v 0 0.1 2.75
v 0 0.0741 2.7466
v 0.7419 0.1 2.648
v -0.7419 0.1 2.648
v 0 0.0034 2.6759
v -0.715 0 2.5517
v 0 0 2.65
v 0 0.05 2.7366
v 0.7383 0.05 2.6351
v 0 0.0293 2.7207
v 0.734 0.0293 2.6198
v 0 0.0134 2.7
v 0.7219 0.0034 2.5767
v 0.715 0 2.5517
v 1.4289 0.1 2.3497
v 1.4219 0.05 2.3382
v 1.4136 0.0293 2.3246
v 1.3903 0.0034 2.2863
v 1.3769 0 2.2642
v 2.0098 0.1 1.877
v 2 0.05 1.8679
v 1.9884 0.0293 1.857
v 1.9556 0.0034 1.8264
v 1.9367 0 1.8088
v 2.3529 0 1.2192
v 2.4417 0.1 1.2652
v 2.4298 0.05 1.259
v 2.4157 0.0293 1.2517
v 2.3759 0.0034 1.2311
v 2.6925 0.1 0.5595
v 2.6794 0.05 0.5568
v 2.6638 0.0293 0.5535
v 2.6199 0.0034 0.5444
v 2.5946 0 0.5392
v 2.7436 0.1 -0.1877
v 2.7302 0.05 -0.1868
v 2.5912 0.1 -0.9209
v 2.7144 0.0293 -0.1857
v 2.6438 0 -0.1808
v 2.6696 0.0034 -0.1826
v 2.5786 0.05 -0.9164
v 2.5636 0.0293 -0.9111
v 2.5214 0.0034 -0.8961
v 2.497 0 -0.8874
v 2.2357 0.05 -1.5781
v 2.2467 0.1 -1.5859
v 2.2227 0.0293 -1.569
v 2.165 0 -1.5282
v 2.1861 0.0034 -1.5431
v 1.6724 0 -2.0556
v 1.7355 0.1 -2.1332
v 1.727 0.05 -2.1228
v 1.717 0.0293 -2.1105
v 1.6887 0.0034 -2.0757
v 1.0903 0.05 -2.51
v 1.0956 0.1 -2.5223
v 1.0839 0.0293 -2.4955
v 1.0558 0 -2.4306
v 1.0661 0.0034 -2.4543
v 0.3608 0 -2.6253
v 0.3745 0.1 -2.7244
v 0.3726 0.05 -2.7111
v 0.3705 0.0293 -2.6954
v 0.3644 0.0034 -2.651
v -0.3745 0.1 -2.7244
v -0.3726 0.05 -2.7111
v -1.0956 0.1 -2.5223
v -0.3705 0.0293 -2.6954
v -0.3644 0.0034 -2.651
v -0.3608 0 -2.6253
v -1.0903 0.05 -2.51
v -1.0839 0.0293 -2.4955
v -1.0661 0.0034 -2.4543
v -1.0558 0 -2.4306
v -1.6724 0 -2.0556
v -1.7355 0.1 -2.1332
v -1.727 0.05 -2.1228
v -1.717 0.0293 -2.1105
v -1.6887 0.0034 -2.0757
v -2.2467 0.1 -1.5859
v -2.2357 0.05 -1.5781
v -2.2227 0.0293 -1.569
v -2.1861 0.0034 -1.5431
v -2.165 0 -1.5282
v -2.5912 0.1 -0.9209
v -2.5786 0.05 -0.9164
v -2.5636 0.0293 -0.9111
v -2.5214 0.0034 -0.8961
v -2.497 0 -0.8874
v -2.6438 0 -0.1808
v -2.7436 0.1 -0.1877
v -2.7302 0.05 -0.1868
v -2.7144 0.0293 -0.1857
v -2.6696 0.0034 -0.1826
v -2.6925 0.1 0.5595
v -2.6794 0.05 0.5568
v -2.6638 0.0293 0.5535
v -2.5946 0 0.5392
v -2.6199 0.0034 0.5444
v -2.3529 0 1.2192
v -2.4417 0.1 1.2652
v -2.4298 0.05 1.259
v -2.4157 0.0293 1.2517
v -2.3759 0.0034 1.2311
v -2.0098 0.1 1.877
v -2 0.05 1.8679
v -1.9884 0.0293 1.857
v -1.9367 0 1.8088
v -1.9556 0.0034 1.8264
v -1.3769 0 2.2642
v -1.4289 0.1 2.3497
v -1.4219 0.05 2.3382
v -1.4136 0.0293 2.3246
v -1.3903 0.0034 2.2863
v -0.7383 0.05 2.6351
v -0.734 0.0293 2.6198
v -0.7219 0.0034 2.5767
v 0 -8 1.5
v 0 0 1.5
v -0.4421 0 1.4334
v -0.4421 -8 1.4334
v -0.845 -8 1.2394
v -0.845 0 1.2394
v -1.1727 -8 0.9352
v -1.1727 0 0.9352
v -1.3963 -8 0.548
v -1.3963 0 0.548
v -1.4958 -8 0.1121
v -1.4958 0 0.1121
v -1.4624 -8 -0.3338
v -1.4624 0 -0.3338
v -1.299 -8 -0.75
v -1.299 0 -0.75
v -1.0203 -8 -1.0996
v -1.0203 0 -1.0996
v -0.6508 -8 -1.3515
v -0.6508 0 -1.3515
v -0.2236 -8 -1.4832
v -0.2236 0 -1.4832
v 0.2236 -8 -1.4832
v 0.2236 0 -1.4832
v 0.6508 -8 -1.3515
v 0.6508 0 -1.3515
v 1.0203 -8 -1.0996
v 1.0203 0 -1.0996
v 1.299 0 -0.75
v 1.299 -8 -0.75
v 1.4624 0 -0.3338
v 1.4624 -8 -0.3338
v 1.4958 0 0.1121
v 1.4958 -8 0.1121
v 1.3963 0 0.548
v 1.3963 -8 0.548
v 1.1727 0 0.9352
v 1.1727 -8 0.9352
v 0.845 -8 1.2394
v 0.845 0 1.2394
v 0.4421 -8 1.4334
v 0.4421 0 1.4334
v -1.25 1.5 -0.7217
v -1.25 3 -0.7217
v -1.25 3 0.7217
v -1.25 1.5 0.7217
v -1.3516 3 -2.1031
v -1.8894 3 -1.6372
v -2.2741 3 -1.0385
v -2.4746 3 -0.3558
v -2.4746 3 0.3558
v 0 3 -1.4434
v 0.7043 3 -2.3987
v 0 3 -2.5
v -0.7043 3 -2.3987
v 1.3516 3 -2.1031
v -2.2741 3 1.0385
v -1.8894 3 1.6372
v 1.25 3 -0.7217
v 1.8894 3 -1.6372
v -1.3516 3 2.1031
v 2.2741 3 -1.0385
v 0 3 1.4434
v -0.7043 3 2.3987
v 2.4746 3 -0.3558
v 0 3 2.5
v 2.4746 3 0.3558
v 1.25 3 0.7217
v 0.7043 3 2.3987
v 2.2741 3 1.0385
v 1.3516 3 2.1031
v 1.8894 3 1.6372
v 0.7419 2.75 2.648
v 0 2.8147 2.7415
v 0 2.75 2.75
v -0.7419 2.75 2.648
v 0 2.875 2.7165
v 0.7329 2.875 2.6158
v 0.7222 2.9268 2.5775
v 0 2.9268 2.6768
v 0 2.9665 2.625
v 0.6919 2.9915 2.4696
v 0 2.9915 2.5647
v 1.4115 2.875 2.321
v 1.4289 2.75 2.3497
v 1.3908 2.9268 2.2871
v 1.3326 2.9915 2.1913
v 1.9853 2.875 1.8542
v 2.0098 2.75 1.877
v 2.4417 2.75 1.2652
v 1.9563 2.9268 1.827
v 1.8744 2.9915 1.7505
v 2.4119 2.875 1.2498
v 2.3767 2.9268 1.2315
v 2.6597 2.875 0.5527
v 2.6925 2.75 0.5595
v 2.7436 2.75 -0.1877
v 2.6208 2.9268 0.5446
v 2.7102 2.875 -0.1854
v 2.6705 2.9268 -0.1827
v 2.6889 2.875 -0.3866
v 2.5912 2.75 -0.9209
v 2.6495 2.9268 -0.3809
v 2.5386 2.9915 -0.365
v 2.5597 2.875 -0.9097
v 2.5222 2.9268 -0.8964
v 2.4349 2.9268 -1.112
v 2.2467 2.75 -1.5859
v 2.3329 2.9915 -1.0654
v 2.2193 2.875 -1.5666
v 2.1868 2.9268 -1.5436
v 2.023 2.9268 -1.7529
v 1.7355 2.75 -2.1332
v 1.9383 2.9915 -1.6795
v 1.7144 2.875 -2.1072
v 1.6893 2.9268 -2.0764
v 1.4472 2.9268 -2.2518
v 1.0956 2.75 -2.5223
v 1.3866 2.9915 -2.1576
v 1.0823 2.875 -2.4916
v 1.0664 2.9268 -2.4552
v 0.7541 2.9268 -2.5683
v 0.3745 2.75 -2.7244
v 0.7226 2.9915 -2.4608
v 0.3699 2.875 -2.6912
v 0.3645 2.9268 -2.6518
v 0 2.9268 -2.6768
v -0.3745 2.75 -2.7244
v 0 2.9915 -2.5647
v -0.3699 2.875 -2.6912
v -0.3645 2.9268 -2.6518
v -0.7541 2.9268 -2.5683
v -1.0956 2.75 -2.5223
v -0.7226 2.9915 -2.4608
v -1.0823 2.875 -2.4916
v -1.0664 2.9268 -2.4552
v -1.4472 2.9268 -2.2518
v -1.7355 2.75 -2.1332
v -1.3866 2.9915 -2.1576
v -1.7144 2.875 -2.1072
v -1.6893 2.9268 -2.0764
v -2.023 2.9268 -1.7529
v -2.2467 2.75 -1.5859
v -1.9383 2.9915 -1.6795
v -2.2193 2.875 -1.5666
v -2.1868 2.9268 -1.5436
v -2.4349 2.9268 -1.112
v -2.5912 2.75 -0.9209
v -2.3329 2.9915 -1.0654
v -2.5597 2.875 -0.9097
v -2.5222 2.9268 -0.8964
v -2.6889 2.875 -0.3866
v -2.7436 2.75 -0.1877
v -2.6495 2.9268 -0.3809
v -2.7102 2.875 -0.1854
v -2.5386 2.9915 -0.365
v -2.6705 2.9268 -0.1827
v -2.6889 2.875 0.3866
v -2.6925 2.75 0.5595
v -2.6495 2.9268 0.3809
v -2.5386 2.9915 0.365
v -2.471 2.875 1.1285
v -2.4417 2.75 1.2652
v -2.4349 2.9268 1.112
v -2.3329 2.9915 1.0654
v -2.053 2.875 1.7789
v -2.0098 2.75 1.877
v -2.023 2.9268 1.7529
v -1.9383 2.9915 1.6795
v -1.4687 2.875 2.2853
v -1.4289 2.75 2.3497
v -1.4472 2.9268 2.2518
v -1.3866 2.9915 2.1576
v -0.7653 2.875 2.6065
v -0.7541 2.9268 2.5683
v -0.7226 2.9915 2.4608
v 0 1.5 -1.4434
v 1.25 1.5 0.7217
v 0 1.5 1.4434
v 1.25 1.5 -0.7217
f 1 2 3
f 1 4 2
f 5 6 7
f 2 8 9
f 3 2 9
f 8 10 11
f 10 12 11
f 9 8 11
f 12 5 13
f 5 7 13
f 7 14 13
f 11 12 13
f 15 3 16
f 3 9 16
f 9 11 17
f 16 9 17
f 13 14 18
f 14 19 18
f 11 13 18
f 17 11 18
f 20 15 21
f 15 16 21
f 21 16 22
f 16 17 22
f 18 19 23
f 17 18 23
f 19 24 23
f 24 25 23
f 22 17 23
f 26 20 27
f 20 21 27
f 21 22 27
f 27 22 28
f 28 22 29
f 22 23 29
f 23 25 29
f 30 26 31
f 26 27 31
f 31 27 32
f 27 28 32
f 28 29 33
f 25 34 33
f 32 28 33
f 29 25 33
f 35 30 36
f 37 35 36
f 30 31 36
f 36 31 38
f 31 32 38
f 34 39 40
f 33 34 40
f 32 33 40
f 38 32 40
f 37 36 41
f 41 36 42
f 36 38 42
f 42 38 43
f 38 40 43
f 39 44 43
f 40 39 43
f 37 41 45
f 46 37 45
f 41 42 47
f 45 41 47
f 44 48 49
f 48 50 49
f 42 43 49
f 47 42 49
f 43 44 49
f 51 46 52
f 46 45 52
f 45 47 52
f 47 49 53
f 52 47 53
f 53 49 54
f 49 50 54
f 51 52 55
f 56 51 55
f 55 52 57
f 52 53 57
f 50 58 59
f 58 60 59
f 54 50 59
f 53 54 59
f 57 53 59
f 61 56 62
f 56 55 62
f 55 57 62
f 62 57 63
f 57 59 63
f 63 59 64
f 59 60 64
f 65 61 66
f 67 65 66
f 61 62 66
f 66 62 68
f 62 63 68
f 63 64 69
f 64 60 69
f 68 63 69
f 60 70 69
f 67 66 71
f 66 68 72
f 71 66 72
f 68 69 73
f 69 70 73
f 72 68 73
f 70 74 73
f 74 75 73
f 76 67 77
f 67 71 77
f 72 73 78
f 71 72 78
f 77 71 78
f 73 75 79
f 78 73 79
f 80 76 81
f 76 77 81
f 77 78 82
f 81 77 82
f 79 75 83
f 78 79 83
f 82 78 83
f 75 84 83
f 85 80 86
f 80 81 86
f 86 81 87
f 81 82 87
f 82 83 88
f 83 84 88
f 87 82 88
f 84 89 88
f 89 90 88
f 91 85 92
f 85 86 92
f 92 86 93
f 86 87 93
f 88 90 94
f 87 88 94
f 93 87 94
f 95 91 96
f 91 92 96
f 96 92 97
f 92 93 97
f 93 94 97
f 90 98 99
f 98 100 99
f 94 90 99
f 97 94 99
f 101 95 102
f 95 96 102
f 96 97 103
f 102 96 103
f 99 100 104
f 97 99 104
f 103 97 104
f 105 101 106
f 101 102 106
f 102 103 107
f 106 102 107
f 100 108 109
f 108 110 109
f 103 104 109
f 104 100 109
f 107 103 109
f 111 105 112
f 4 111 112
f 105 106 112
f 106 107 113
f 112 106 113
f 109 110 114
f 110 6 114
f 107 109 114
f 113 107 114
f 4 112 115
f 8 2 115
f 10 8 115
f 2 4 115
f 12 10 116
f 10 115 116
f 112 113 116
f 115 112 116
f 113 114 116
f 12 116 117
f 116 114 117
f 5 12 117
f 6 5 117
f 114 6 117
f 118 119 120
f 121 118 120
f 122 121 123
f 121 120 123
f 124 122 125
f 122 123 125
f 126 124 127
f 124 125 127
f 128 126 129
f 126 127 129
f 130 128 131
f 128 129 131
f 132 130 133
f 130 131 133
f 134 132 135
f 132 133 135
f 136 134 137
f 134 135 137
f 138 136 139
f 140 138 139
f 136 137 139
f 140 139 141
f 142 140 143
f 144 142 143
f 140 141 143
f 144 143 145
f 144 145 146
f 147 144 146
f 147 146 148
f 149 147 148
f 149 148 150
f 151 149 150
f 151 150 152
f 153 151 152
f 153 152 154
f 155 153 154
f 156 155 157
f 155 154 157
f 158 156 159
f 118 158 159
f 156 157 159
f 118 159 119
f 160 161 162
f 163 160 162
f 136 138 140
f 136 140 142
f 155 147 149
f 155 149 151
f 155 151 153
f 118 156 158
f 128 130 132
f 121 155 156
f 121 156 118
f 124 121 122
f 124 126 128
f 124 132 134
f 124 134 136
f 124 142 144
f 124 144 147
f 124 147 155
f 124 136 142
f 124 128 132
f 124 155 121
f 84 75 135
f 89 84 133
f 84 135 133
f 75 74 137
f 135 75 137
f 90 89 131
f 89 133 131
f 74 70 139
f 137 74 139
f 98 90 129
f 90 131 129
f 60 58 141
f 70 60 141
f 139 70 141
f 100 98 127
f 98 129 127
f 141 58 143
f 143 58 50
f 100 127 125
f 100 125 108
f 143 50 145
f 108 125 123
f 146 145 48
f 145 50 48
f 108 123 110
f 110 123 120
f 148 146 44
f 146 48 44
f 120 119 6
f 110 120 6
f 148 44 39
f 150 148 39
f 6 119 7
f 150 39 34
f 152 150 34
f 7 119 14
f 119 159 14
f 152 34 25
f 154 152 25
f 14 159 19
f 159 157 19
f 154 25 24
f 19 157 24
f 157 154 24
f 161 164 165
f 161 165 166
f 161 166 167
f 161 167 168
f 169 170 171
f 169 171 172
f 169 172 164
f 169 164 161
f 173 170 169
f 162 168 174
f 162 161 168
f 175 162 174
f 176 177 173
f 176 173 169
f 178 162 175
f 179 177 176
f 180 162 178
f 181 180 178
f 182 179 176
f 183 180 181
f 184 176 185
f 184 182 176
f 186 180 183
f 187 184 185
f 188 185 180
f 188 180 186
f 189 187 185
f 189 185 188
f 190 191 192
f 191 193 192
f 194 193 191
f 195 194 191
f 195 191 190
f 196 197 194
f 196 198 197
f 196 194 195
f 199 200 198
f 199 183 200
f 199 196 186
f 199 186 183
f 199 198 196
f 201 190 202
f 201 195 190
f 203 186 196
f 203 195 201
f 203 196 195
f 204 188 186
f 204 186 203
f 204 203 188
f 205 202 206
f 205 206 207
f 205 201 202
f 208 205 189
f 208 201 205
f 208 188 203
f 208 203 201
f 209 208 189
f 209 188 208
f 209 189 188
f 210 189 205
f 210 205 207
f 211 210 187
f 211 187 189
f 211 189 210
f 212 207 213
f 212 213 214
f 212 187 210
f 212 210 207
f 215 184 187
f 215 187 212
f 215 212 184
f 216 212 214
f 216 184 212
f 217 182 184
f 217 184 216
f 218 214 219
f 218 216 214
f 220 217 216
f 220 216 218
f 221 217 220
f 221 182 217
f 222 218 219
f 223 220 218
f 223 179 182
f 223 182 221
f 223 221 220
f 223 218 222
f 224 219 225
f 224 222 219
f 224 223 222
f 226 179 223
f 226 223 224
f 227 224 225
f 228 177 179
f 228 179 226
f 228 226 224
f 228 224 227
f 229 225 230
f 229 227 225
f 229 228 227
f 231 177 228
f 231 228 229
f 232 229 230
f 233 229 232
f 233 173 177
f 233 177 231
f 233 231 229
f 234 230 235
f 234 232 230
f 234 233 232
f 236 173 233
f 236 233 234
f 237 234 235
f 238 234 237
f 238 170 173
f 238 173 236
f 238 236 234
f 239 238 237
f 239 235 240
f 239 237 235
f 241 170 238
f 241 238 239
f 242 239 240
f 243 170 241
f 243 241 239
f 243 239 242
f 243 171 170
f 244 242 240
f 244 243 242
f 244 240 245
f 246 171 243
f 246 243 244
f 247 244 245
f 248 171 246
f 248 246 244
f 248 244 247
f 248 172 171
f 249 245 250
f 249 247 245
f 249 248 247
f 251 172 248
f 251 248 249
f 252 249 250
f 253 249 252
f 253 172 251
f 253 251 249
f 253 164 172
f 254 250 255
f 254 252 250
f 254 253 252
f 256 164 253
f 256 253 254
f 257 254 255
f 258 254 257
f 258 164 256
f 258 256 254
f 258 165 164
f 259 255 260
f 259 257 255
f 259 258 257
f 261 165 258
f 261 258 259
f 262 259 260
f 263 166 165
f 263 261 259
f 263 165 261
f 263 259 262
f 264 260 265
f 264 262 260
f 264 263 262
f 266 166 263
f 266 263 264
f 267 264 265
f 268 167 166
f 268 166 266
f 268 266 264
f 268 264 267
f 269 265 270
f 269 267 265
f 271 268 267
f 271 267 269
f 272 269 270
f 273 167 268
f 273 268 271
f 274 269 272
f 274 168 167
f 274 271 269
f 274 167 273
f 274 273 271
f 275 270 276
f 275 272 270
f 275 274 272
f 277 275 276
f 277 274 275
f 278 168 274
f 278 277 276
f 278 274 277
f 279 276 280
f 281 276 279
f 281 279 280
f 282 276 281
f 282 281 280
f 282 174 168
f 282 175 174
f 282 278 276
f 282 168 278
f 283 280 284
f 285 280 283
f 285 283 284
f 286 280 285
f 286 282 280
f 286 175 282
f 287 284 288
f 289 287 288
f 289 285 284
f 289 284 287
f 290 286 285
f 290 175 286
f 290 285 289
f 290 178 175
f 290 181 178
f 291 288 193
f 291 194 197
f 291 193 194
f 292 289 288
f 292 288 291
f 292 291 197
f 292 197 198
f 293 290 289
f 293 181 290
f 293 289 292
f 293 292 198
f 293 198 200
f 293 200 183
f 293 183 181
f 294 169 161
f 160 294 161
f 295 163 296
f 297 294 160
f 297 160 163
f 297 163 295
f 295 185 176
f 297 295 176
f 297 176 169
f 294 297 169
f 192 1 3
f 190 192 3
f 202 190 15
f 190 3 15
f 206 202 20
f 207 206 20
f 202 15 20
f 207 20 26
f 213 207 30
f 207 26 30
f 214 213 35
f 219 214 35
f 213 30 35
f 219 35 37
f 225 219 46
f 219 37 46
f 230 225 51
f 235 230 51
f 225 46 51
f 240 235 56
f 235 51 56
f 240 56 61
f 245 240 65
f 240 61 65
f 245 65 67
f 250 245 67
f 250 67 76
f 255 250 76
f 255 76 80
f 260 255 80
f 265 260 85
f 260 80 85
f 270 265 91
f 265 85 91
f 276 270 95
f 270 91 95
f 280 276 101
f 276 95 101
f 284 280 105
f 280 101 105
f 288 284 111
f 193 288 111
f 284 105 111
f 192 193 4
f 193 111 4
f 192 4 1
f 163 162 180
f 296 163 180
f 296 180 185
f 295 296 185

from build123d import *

# Parameters (mm, degrees)
ESBO_O1_R                = 2.75
RESSALTO_EXTRUS_O1_DEPTH = 3
CORTE_EXTRUS_O1_DEPTH    = 1.5
FILETE1_R                = 0.25
FILETE2_R                = 0.1
ESBO_O3_R                = 1.5
RESSALTO_EXTRUS_O2_DEPTH = 8


with BuildPart() as part:
    # Esboço1 → Ressalto-extrusão1 (new body)
    with BuildSketch(Plane(origin=(0, 0, 0), x_dir=(1, 0, 0), z_dir=(0, 1, 0))):
        with Locations(Location((0, 0, 0), (0, 0, 270))):
            Circle(ESBO_O1_R)
    extrude(amount=RESSALTO_EXTRUS_O1_DEPTH)

    # Esboço2 → Corte-extrusão1 (cut)
    with BuildSketch(Plane(origin=(0, 3, 0), x_dir=(1, 0, 0), z_dir=(0, 1, 0))):
        Polygon((0, 1.443375673), (-1.25, 0.721687836), (-1.25, -0.721687836), (0, -1.443375673), (1.25, -0.721687836), (1.25, 0.721687836), align=None)
    extrude(amount=-CORTE_EXTRUS_O1_DEPTH, mode=Mode.SUBTRACT)

    # Filete1
    filete1_edges = [part.edges().sort_by_distance(p)[0] for p in [
        (0, 3, -2.75),
    ]]
    fillet(filete1_edges, radius=FILETE1_R)

    # Filete2
    filete2_edges = [part.edges().sort_by_distance(p)[0] for p in [
        (0, 0, -2.75),
    ]]
    fillet(filete2_edges, radius=FILETE2_R)

    # Esboço3 → Ressalto-extrusão2 (add)
    with BuildSketch(Plane.XZ):
        with Locations(Location((0, 0, 0), (0, 0, 90))):
            Circle(ESBO_O3_R)
    extrude(amount=RESSALTO_EXTRUS_O2_DEPTH)


solid = part.part
